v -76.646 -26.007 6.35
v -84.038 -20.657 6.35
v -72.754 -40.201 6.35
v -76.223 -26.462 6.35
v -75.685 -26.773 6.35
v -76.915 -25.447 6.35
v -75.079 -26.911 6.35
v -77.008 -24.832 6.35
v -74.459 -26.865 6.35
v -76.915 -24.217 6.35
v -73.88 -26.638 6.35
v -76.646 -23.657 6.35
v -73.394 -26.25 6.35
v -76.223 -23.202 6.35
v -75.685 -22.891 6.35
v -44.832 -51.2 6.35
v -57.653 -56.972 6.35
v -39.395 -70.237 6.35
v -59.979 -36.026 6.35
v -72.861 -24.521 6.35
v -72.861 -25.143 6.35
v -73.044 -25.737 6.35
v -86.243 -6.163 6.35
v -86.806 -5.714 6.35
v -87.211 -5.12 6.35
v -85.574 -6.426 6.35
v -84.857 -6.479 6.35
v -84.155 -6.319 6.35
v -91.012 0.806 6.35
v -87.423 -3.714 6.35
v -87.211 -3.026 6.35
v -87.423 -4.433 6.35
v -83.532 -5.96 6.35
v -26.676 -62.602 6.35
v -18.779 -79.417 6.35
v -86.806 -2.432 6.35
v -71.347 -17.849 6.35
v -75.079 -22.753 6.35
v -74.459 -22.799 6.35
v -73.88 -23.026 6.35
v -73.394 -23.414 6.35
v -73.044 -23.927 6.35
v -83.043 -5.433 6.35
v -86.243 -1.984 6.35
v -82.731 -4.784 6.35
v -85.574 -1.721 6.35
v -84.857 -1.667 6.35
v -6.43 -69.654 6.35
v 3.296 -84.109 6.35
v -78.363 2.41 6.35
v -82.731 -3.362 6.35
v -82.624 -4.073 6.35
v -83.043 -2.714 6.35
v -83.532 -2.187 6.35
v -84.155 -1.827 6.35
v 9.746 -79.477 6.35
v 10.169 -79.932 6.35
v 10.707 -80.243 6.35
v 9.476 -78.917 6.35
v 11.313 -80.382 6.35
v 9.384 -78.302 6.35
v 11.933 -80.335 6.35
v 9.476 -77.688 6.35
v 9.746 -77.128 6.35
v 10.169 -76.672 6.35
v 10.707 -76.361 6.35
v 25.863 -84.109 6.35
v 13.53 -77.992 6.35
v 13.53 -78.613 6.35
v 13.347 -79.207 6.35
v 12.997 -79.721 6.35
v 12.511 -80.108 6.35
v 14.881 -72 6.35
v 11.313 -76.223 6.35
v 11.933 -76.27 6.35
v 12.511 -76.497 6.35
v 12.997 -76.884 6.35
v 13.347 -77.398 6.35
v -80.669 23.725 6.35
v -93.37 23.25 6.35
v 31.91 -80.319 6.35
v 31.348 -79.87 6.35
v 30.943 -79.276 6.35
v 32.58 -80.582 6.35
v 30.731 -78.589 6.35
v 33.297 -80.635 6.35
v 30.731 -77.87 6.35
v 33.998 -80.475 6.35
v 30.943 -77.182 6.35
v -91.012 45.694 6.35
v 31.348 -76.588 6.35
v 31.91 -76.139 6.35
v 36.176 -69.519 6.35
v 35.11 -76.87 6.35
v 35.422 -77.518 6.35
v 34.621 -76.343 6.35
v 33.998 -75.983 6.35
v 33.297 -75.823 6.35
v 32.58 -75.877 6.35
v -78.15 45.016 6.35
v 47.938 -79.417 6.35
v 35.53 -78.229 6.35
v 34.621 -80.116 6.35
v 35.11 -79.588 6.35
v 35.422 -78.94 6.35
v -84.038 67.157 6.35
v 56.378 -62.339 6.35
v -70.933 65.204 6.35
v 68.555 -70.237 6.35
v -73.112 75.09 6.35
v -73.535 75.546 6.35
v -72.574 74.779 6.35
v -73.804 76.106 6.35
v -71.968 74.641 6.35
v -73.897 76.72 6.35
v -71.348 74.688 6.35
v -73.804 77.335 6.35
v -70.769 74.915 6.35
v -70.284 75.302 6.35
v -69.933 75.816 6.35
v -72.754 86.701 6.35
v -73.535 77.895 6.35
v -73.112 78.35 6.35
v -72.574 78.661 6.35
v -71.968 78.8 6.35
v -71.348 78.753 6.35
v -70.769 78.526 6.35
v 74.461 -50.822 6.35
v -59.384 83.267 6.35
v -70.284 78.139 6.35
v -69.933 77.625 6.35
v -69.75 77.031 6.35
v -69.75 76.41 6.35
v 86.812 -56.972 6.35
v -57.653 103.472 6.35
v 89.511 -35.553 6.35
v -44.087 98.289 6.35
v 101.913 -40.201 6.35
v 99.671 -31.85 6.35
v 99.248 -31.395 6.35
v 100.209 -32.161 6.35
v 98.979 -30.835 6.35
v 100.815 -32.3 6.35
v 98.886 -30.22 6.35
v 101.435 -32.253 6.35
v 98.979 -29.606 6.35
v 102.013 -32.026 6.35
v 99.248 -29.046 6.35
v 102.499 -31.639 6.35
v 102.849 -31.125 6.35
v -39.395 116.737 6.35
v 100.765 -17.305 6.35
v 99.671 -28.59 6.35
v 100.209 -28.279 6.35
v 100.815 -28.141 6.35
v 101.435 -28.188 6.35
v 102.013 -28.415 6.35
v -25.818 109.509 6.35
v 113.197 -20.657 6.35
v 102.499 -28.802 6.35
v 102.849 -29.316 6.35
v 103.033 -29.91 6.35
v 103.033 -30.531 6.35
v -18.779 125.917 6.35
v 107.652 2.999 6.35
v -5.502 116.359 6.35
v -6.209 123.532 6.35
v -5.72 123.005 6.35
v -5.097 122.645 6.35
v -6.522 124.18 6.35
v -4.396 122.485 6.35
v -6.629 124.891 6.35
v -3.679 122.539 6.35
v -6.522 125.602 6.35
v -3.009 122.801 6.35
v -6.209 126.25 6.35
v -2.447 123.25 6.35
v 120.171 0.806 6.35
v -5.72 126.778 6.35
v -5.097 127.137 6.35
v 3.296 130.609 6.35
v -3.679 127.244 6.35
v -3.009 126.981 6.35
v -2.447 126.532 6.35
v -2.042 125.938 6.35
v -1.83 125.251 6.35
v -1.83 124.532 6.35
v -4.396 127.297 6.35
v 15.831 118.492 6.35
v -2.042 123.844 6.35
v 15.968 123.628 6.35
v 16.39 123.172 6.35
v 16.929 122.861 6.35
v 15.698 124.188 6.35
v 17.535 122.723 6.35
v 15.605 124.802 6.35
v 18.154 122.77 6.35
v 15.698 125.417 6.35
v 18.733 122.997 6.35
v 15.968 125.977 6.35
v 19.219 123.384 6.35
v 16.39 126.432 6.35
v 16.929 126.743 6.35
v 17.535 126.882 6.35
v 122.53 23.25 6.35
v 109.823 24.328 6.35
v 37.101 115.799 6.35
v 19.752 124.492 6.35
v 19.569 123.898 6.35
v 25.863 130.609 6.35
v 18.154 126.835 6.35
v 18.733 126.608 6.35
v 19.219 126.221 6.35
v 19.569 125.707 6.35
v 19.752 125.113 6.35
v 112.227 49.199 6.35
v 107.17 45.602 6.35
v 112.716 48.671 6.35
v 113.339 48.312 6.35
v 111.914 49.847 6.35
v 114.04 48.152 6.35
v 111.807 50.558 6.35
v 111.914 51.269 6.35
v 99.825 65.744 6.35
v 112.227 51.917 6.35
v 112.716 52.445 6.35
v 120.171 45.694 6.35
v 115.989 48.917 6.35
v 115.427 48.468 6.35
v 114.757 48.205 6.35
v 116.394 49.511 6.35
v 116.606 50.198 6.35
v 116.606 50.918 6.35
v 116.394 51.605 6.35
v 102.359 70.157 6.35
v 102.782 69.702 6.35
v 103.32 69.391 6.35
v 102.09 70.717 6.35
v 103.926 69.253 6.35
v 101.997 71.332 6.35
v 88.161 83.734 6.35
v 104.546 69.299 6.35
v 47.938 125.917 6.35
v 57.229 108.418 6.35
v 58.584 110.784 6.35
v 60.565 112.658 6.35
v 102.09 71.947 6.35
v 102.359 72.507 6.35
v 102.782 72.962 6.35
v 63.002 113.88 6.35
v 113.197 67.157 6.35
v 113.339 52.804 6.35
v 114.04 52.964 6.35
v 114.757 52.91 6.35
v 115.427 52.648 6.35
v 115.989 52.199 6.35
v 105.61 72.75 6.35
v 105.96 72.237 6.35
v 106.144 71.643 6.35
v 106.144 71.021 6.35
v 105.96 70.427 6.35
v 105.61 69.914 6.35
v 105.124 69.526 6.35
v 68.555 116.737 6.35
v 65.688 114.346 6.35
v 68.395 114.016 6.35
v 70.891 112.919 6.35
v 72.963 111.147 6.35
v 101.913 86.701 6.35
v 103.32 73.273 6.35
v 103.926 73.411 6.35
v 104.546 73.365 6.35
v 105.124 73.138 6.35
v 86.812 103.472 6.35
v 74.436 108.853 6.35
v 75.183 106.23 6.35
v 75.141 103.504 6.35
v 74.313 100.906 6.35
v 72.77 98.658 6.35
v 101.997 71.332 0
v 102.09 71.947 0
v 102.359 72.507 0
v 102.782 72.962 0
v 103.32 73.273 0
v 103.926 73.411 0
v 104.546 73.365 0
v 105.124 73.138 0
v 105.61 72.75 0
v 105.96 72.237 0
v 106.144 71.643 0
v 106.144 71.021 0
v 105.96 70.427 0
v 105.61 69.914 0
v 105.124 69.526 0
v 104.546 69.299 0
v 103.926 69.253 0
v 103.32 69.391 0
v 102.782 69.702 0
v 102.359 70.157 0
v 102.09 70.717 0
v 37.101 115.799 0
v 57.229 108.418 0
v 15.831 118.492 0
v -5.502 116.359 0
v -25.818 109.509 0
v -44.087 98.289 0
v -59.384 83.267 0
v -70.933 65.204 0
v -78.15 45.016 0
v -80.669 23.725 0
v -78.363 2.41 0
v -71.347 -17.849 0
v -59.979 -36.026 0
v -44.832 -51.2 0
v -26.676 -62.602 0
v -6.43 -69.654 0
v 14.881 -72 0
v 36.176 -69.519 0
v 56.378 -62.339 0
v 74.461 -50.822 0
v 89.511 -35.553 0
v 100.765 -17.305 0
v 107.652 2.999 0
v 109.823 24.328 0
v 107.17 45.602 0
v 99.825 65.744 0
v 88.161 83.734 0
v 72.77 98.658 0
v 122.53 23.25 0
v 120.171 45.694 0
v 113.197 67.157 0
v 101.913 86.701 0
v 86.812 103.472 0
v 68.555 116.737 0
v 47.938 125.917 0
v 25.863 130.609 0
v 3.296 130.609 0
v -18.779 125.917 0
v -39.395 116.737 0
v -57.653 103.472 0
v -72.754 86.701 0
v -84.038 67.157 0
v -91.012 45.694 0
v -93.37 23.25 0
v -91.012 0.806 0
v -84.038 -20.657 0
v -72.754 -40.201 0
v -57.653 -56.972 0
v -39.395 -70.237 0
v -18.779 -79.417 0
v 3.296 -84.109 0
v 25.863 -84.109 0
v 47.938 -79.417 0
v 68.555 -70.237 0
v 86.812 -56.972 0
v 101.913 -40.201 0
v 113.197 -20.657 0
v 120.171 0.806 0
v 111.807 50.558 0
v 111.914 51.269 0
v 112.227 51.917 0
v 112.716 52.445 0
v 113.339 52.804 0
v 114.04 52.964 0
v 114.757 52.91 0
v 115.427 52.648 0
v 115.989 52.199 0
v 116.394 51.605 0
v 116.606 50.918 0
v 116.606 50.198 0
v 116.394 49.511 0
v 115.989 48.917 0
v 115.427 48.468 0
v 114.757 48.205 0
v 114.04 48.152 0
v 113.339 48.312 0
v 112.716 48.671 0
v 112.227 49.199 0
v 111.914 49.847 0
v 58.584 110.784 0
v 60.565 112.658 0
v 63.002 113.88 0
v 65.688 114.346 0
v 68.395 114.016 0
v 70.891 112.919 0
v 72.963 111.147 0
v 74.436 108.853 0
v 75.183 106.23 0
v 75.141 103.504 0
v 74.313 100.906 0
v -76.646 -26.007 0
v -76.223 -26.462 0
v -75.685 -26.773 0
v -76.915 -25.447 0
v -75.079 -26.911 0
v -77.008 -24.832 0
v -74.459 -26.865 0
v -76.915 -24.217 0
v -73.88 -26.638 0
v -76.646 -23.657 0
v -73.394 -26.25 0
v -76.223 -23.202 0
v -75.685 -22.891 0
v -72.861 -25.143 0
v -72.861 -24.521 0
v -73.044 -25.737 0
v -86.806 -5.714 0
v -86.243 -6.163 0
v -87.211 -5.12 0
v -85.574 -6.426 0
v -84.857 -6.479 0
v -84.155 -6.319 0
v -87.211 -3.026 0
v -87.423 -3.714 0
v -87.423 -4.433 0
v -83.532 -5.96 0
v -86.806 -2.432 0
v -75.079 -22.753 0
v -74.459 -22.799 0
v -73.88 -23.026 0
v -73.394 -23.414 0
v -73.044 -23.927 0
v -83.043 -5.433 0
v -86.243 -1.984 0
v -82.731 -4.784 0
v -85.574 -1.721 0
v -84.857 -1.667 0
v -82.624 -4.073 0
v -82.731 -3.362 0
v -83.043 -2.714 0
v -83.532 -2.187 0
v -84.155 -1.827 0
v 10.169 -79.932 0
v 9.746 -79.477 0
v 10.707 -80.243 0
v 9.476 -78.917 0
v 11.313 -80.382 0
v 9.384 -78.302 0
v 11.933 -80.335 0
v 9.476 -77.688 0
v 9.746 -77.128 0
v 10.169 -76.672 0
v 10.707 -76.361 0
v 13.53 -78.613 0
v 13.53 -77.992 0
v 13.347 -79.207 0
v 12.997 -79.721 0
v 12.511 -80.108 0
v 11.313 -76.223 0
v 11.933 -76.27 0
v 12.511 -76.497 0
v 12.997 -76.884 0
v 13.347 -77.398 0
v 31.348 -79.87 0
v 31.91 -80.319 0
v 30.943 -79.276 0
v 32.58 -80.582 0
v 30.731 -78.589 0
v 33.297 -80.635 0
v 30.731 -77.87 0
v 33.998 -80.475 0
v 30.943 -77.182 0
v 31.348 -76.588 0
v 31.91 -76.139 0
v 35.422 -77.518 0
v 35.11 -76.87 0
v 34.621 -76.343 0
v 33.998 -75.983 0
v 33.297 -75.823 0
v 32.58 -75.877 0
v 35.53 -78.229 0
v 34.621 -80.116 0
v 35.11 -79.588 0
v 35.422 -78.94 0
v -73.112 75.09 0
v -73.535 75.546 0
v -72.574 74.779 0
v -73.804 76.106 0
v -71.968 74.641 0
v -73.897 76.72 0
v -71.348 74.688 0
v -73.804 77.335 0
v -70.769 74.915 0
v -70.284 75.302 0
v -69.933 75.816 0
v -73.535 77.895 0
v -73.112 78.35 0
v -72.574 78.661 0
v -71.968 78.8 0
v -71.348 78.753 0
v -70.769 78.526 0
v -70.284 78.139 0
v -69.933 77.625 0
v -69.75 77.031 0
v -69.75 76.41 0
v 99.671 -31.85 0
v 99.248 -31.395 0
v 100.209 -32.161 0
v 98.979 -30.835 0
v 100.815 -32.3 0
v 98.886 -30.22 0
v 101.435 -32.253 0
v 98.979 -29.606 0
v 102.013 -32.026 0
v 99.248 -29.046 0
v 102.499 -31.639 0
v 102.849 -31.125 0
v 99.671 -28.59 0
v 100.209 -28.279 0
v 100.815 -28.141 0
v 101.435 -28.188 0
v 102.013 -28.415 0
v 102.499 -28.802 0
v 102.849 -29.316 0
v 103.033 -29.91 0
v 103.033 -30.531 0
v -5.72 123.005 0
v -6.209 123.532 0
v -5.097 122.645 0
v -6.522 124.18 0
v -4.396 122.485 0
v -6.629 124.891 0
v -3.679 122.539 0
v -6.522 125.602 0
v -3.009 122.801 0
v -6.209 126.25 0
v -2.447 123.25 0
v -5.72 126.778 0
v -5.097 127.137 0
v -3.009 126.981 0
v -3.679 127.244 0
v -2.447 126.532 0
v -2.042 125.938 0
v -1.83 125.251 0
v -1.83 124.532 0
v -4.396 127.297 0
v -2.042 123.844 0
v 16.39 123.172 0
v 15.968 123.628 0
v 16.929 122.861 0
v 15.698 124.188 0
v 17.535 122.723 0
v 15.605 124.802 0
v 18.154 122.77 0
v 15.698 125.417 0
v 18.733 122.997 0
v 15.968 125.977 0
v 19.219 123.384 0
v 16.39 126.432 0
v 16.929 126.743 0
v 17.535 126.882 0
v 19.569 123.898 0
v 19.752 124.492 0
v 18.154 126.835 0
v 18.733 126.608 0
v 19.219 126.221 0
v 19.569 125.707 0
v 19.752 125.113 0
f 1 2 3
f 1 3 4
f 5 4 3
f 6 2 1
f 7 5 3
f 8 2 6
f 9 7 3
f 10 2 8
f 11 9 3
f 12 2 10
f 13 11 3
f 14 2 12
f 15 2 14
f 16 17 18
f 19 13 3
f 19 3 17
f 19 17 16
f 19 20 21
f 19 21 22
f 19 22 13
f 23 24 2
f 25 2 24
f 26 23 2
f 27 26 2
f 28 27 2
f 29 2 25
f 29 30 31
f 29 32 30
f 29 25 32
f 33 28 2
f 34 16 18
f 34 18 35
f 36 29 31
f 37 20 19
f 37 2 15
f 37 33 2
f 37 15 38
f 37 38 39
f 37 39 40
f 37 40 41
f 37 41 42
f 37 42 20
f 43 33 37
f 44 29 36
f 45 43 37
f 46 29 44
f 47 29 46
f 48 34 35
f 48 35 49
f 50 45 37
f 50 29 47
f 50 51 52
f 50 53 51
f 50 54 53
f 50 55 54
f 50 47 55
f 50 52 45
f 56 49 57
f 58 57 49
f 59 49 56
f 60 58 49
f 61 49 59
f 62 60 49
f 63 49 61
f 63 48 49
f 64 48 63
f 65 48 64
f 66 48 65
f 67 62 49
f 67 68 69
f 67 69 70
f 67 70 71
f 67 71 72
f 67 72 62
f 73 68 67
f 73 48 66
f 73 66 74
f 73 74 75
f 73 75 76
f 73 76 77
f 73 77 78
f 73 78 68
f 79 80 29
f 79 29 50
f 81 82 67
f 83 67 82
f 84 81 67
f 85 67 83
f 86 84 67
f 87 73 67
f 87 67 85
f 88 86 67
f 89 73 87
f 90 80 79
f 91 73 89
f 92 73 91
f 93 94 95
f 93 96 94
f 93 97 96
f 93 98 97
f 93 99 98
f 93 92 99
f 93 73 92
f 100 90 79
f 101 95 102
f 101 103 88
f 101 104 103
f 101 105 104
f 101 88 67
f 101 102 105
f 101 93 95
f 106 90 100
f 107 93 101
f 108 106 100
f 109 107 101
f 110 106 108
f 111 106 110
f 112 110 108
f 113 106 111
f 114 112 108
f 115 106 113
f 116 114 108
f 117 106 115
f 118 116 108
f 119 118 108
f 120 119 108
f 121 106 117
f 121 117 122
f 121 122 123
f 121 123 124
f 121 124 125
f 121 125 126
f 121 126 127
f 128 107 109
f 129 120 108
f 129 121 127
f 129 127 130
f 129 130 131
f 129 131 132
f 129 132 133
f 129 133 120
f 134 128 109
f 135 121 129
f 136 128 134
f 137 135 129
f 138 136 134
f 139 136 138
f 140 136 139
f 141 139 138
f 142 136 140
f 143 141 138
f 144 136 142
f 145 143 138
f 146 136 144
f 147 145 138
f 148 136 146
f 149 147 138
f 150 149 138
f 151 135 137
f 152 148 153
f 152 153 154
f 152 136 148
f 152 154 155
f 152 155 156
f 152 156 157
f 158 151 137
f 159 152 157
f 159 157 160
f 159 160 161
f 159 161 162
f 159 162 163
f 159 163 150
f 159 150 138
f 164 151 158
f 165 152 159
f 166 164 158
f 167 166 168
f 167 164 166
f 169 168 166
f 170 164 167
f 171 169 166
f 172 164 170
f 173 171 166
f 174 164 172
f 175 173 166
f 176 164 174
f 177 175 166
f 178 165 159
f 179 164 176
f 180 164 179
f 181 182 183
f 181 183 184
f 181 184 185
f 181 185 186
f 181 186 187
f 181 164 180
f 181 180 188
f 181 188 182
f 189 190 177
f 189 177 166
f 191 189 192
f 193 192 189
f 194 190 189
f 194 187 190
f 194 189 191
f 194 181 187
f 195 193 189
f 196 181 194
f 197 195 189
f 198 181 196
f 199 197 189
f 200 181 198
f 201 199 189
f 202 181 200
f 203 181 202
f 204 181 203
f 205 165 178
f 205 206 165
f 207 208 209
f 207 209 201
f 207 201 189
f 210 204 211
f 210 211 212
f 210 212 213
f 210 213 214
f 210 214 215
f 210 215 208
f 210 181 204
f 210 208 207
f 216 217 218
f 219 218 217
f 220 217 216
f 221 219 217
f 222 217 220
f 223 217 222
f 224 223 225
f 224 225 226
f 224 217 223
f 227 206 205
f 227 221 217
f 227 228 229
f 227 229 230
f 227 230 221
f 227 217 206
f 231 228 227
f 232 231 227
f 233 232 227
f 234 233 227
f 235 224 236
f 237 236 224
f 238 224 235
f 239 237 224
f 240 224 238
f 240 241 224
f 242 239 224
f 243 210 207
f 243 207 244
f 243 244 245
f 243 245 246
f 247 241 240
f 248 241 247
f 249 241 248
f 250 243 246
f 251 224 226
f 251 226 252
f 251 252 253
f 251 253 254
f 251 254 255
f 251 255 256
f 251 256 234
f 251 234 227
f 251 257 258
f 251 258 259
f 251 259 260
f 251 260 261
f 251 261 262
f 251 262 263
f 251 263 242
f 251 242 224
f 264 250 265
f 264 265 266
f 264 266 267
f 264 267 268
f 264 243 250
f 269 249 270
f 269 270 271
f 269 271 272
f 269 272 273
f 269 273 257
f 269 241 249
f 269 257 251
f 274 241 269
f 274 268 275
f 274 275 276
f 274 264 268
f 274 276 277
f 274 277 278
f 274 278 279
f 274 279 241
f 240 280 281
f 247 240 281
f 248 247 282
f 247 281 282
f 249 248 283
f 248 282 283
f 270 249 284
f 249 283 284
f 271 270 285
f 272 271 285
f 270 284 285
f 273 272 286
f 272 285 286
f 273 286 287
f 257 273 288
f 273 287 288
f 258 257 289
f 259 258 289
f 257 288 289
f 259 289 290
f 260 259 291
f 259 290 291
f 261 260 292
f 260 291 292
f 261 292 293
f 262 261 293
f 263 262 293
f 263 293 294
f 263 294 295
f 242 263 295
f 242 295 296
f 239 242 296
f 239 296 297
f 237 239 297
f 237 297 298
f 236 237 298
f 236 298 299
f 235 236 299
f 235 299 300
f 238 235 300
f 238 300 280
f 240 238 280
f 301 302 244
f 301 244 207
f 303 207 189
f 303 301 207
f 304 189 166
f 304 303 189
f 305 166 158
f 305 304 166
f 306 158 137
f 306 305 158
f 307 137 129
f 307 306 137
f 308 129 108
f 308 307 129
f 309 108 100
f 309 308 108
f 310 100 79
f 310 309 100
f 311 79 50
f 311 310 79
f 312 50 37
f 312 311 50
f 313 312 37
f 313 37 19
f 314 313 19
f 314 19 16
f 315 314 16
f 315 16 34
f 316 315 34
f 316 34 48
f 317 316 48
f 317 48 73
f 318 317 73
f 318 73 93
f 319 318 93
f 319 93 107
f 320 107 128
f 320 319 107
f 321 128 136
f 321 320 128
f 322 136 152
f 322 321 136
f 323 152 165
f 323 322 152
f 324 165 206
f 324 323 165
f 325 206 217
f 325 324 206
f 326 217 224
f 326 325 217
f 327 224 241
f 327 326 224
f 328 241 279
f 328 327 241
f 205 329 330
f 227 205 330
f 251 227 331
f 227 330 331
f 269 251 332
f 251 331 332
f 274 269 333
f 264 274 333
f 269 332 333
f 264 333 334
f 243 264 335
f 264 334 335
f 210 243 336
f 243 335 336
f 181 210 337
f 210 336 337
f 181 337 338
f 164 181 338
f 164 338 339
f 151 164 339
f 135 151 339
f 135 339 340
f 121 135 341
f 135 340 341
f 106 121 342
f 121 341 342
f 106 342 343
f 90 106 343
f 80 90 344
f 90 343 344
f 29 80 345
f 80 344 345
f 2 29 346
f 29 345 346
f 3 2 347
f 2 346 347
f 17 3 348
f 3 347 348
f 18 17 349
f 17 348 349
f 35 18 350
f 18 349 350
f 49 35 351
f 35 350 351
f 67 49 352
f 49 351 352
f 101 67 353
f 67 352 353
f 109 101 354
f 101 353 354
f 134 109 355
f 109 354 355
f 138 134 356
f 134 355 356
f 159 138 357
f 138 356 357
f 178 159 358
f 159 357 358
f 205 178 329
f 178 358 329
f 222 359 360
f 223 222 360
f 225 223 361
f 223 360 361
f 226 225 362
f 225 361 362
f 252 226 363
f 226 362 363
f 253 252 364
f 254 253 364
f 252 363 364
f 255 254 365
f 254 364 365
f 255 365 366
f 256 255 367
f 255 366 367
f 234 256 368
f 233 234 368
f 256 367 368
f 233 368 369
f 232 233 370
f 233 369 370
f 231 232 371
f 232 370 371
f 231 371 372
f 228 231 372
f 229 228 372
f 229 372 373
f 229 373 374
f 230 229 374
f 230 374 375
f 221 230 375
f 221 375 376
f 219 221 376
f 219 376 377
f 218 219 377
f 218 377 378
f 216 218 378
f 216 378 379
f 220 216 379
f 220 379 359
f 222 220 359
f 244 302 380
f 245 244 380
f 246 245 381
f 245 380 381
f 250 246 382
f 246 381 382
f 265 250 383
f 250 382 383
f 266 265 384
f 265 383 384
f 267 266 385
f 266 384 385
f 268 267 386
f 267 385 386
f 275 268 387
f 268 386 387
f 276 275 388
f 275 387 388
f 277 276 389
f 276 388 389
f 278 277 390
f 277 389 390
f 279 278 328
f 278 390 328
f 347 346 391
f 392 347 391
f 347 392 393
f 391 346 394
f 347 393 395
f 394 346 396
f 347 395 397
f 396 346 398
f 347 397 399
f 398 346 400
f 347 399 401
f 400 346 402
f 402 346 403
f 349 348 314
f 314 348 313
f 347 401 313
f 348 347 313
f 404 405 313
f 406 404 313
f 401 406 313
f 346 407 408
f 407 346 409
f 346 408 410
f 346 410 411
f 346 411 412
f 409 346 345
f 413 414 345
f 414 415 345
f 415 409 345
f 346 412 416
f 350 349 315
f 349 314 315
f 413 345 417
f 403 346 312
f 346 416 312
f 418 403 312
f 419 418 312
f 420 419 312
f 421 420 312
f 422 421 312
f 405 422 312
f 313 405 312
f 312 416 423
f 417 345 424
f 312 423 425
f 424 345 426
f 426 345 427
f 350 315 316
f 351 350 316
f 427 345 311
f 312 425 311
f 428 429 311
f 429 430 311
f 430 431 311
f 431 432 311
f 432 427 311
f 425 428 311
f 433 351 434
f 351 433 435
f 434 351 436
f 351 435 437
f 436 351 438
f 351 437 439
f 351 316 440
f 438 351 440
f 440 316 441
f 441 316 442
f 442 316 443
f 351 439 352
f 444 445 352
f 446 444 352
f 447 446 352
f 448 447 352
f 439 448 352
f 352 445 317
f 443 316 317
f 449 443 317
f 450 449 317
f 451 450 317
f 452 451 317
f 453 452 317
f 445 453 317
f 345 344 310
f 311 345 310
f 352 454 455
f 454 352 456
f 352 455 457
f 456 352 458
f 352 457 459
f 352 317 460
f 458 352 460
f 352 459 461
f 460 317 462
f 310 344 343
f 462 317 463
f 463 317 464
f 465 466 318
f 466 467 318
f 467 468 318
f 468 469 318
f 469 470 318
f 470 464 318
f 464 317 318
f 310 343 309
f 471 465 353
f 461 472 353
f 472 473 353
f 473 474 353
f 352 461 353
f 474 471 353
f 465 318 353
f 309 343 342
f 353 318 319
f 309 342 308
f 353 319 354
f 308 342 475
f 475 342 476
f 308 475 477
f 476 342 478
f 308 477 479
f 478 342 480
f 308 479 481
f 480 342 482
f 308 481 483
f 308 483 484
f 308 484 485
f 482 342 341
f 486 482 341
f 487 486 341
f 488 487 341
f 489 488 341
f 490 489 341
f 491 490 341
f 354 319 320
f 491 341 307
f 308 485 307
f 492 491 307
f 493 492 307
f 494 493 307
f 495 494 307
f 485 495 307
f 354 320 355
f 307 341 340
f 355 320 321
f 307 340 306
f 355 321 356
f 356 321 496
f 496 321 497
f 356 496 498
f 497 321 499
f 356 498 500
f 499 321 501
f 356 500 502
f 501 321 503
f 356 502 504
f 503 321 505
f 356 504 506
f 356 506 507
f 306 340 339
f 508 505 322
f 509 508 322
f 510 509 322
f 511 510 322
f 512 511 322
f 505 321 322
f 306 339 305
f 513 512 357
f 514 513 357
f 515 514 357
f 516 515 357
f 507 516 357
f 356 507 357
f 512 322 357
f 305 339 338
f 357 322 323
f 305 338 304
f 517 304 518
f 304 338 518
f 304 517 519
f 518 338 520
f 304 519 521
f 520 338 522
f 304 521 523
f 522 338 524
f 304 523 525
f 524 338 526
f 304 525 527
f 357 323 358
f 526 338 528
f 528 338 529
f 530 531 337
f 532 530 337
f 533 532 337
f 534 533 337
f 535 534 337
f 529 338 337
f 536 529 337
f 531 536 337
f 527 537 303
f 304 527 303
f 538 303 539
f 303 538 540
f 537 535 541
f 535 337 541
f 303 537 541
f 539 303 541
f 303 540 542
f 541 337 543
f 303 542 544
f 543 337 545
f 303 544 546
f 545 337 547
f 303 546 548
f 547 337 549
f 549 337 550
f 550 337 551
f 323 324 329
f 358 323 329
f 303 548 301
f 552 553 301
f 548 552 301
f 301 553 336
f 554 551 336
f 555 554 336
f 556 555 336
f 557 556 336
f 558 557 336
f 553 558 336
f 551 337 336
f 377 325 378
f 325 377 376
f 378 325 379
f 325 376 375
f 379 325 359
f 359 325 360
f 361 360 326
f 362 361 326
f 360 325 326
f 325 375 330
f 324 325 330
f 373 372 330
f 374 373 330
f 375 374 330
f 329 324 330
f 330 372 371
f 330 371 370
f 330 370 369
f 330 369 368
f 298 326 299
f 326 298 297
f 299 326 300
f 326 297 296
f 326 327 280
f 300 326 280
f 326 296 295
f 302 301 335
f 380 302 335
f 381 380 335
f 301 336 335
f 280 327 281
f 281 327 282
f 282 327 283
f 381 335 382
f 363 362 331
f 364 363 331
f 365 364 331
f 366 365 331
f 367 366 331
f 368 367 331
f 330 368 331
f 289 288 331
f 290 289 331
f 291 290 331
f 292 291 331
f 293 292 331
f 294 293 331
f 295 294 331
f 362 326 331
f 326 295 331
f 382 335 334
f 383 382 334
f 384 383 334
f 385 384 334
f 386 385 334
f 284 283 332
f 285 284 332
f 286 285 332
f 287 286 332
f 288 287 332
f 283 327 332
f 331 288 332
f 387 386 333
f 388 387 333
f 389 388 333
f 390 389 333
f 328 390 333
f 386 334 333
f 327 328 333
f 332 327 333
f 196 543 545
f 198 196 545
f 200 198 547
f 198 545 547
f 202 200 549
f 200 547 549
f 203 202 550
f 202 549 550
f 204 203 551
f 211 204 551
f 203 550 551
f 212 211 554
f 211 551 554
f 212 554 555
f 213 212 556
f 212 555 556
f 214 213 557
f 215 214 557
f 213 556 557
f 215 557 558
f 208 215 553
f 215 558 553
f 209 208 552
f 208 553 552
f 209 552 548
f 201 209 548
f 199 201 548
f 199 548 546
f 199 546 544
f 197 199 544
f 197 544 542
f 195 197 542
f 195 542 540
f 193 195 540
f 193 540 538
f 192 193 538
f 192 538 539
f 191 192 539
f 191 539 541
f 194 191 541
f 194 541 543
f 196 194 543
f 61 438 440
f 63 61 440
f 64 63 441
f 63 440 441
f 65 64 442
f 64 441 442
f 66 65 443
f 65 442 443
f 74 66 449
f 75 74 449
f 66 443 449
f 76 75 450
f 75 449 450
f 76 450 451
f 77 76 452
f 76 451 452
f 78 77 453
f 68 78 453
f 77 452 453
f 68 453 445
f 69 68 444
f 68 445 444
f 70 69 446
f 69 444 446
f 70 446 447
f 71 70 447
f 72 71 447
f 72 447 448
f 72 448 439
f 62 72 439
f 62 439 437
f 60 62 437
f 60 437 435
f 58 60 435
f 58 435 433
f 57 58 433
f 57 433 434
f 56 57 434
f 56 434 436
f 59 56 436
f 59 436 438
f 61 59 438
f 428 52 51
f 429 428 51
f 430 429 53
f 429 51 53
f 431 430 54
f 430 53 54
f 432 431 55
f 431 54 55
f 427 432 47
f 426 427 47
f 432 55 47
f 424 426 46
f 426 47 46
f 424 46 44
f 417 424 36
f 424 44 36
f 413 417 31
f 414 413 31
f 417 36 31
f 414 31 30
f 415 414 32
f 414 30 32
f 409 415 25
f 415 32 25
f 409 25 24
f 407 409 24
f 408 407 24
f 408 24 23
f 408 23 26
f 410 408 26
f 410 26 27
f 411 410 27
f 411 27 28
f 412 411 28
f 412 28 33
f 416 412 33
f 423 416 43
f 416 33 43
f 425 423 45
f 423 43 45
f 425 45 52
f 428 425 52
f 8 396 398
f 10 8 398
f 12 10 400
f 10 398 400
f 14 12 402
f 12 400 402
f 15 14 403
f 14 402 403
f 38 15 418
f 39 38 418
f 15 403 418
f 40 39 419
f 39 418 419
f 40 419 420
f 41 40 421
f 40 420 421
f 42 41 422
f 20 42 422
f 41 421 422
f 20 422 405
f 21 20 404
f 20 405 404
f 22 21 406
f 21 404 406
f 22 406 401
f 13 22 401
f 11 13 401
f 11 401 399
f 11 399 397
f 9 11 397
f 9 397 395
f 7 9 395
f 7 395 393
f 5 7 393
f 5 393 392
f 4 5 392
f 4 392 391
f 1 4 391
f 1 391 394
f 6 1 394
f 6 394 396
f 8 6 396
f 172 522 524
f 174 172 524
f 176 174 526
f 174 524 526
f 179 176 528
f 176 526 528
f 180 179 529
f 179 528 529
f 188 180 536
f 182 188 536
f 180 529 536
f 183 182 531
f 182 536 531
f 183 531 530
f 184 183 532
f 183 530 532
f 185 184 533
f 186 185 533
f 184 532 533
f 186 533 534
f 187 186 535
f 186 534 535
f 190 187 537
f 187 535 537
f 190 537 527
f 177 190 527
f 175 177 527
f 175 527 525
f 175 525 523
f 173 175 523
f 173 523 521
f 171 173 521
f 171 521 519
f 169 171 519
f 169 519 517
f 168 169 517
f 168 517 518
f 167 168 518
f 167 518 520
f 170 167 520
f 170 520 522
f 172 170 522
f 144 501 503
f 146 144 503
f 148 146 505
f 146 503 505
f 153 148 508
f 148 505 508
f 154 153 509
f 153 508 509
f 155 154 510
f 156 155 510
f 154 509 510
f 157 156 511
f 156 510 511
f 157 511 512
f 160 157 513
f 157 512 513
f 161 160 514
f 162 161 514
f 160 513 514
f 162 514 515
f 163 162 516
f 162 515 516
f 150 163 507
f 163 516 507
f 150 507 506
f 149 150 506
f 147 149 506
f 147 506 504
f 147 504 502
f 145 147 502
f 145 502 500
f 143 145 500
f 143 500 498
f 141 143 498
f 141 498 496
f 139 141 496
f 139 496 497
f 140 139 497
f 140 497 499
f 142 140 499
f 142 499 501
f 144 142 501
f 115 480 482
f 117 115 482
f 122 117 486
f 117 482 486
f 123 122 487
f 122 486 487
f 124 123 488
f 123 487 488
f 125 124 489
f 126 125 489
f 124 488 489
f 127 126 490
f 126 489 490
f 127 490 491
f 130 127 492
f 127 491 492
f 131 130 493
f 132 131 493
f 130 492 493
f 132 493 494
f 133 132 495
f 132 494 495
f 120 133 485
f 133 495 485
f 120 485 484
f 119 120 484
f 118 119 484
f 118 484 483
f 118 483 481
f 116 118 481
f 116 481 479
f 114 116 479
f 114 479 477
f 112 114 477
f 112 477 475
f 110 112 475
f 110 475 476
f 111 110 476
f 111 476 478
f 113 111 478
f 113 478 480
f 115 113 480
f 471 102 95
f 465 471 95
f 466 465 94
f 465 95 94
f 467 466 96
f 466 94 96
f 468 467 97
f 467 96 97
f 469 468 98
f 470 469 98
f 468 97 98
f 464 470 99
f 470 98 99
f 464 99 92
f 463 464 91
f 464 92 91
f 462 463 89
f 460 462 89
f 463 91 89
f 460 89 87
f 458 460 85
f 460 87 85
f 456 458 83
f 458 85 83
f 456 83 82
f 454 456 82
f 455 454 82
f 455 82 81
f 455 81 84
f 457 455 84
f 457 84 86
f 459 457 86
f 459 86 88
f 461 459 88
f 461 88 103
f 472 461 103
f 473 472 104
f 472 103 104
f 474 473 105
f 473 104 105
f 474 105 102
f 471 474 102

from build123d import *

# Parameters (mm, degrees)
SKETCH1_R           = 107.95
SKETCH1_R_2         = 95.25
BOSS_EXTRUDE1_DEPTH = 6.35
SKETCH2_R           = 2.085
SKETCH2_R_2         = 2.413
CUT_EXTRUDE1_DEPTH  = 21.336
SKETCH3_R           = 9.338597003
CUT_EXTRUDE2_DEPTH  = 7.35
SKETCH4_R           = 2.413
CUT_EXTRUDE3_DEPTH  = 6.35


with BuildPart() as part:
    # Sketch1 → Boss-Extrude1 (new body)
    with BuildSketch(Plane.XY):
        with Locations((14.57950887, 23.250008023)):
            Circle(SKETCH1_R)
        with Locations((14.57950887, 23.250008023)):
            Circle(SKETCH1_R_2, mode=Mode.SUBTRACT)
    extrude(amount=BOSS_EXTRUDE1_DEPTH)

    # Sketch2 → Cut-Extrude1 (cut)
    with BuildSketch(Plane(origin=(0, 0, 0), x_dir=(-1, 0, 0), z_dir=(0, 0, -1))):
        with Locations((-104.081912459, 71.332018712)):
            Circle(SKETCH2_R)
        with Locations((-17.690467943, 124.802368575)):
            Circle(SKETCH2_R)
        with Locations((71.811935646, 76.720357886)):
            Circle(SKETCH2_R)
        with Locations((74.922894719, -24.832002665)):
            Circle(SKETCH2_R)
        with Locations((-11.468549797, -78.302352529)):
            Circle(SKETCH2_R)
        with Locations((-100.970953386, -30.22034184)):
            Circle(SKETCH2_R)
        with Locations((4.215773698, 124.891191499)):
            Circle(SKETCH2_R_2)
        with Locations((-114.220260226, 50.557967298)):
            Circle(SKETCH2_R_2)
    extrude(amount=-CUT_EXTRUDE1_DEPTH, mode=Mode.SUBTRACT)

    # Sketch3 → Cut-Extrude2 (cut, through all)
    with BuildSketch(Plane(origin=(0, 0, 0), x_dir=(-1, 0, 0), z_dir=(0, 0, -1))):
        with Locations((-65.924155814, 105.010280384)):
            Circle(SKETCH3_R)
    extrude(amount=-CUT_EXTRUDE2_DEPTH, mode=Mode.SUBTRACT)

    # Sketch4 → Cut-Extrude3 (cut)
    with BuildSketch(Plane.XY.offset(6.35)):
        with Locations((33.116626404, -78.229145041)):
            Circle(SKETCH4_R)
        with Locations((-85.036904703, -4.073226214)):
            Circle(SKETCH4_R)
    extrude(amount=-CUT_EXTRUDE3_DEPTH, mode=Mode.SUBTRACT)


solid = part.part
